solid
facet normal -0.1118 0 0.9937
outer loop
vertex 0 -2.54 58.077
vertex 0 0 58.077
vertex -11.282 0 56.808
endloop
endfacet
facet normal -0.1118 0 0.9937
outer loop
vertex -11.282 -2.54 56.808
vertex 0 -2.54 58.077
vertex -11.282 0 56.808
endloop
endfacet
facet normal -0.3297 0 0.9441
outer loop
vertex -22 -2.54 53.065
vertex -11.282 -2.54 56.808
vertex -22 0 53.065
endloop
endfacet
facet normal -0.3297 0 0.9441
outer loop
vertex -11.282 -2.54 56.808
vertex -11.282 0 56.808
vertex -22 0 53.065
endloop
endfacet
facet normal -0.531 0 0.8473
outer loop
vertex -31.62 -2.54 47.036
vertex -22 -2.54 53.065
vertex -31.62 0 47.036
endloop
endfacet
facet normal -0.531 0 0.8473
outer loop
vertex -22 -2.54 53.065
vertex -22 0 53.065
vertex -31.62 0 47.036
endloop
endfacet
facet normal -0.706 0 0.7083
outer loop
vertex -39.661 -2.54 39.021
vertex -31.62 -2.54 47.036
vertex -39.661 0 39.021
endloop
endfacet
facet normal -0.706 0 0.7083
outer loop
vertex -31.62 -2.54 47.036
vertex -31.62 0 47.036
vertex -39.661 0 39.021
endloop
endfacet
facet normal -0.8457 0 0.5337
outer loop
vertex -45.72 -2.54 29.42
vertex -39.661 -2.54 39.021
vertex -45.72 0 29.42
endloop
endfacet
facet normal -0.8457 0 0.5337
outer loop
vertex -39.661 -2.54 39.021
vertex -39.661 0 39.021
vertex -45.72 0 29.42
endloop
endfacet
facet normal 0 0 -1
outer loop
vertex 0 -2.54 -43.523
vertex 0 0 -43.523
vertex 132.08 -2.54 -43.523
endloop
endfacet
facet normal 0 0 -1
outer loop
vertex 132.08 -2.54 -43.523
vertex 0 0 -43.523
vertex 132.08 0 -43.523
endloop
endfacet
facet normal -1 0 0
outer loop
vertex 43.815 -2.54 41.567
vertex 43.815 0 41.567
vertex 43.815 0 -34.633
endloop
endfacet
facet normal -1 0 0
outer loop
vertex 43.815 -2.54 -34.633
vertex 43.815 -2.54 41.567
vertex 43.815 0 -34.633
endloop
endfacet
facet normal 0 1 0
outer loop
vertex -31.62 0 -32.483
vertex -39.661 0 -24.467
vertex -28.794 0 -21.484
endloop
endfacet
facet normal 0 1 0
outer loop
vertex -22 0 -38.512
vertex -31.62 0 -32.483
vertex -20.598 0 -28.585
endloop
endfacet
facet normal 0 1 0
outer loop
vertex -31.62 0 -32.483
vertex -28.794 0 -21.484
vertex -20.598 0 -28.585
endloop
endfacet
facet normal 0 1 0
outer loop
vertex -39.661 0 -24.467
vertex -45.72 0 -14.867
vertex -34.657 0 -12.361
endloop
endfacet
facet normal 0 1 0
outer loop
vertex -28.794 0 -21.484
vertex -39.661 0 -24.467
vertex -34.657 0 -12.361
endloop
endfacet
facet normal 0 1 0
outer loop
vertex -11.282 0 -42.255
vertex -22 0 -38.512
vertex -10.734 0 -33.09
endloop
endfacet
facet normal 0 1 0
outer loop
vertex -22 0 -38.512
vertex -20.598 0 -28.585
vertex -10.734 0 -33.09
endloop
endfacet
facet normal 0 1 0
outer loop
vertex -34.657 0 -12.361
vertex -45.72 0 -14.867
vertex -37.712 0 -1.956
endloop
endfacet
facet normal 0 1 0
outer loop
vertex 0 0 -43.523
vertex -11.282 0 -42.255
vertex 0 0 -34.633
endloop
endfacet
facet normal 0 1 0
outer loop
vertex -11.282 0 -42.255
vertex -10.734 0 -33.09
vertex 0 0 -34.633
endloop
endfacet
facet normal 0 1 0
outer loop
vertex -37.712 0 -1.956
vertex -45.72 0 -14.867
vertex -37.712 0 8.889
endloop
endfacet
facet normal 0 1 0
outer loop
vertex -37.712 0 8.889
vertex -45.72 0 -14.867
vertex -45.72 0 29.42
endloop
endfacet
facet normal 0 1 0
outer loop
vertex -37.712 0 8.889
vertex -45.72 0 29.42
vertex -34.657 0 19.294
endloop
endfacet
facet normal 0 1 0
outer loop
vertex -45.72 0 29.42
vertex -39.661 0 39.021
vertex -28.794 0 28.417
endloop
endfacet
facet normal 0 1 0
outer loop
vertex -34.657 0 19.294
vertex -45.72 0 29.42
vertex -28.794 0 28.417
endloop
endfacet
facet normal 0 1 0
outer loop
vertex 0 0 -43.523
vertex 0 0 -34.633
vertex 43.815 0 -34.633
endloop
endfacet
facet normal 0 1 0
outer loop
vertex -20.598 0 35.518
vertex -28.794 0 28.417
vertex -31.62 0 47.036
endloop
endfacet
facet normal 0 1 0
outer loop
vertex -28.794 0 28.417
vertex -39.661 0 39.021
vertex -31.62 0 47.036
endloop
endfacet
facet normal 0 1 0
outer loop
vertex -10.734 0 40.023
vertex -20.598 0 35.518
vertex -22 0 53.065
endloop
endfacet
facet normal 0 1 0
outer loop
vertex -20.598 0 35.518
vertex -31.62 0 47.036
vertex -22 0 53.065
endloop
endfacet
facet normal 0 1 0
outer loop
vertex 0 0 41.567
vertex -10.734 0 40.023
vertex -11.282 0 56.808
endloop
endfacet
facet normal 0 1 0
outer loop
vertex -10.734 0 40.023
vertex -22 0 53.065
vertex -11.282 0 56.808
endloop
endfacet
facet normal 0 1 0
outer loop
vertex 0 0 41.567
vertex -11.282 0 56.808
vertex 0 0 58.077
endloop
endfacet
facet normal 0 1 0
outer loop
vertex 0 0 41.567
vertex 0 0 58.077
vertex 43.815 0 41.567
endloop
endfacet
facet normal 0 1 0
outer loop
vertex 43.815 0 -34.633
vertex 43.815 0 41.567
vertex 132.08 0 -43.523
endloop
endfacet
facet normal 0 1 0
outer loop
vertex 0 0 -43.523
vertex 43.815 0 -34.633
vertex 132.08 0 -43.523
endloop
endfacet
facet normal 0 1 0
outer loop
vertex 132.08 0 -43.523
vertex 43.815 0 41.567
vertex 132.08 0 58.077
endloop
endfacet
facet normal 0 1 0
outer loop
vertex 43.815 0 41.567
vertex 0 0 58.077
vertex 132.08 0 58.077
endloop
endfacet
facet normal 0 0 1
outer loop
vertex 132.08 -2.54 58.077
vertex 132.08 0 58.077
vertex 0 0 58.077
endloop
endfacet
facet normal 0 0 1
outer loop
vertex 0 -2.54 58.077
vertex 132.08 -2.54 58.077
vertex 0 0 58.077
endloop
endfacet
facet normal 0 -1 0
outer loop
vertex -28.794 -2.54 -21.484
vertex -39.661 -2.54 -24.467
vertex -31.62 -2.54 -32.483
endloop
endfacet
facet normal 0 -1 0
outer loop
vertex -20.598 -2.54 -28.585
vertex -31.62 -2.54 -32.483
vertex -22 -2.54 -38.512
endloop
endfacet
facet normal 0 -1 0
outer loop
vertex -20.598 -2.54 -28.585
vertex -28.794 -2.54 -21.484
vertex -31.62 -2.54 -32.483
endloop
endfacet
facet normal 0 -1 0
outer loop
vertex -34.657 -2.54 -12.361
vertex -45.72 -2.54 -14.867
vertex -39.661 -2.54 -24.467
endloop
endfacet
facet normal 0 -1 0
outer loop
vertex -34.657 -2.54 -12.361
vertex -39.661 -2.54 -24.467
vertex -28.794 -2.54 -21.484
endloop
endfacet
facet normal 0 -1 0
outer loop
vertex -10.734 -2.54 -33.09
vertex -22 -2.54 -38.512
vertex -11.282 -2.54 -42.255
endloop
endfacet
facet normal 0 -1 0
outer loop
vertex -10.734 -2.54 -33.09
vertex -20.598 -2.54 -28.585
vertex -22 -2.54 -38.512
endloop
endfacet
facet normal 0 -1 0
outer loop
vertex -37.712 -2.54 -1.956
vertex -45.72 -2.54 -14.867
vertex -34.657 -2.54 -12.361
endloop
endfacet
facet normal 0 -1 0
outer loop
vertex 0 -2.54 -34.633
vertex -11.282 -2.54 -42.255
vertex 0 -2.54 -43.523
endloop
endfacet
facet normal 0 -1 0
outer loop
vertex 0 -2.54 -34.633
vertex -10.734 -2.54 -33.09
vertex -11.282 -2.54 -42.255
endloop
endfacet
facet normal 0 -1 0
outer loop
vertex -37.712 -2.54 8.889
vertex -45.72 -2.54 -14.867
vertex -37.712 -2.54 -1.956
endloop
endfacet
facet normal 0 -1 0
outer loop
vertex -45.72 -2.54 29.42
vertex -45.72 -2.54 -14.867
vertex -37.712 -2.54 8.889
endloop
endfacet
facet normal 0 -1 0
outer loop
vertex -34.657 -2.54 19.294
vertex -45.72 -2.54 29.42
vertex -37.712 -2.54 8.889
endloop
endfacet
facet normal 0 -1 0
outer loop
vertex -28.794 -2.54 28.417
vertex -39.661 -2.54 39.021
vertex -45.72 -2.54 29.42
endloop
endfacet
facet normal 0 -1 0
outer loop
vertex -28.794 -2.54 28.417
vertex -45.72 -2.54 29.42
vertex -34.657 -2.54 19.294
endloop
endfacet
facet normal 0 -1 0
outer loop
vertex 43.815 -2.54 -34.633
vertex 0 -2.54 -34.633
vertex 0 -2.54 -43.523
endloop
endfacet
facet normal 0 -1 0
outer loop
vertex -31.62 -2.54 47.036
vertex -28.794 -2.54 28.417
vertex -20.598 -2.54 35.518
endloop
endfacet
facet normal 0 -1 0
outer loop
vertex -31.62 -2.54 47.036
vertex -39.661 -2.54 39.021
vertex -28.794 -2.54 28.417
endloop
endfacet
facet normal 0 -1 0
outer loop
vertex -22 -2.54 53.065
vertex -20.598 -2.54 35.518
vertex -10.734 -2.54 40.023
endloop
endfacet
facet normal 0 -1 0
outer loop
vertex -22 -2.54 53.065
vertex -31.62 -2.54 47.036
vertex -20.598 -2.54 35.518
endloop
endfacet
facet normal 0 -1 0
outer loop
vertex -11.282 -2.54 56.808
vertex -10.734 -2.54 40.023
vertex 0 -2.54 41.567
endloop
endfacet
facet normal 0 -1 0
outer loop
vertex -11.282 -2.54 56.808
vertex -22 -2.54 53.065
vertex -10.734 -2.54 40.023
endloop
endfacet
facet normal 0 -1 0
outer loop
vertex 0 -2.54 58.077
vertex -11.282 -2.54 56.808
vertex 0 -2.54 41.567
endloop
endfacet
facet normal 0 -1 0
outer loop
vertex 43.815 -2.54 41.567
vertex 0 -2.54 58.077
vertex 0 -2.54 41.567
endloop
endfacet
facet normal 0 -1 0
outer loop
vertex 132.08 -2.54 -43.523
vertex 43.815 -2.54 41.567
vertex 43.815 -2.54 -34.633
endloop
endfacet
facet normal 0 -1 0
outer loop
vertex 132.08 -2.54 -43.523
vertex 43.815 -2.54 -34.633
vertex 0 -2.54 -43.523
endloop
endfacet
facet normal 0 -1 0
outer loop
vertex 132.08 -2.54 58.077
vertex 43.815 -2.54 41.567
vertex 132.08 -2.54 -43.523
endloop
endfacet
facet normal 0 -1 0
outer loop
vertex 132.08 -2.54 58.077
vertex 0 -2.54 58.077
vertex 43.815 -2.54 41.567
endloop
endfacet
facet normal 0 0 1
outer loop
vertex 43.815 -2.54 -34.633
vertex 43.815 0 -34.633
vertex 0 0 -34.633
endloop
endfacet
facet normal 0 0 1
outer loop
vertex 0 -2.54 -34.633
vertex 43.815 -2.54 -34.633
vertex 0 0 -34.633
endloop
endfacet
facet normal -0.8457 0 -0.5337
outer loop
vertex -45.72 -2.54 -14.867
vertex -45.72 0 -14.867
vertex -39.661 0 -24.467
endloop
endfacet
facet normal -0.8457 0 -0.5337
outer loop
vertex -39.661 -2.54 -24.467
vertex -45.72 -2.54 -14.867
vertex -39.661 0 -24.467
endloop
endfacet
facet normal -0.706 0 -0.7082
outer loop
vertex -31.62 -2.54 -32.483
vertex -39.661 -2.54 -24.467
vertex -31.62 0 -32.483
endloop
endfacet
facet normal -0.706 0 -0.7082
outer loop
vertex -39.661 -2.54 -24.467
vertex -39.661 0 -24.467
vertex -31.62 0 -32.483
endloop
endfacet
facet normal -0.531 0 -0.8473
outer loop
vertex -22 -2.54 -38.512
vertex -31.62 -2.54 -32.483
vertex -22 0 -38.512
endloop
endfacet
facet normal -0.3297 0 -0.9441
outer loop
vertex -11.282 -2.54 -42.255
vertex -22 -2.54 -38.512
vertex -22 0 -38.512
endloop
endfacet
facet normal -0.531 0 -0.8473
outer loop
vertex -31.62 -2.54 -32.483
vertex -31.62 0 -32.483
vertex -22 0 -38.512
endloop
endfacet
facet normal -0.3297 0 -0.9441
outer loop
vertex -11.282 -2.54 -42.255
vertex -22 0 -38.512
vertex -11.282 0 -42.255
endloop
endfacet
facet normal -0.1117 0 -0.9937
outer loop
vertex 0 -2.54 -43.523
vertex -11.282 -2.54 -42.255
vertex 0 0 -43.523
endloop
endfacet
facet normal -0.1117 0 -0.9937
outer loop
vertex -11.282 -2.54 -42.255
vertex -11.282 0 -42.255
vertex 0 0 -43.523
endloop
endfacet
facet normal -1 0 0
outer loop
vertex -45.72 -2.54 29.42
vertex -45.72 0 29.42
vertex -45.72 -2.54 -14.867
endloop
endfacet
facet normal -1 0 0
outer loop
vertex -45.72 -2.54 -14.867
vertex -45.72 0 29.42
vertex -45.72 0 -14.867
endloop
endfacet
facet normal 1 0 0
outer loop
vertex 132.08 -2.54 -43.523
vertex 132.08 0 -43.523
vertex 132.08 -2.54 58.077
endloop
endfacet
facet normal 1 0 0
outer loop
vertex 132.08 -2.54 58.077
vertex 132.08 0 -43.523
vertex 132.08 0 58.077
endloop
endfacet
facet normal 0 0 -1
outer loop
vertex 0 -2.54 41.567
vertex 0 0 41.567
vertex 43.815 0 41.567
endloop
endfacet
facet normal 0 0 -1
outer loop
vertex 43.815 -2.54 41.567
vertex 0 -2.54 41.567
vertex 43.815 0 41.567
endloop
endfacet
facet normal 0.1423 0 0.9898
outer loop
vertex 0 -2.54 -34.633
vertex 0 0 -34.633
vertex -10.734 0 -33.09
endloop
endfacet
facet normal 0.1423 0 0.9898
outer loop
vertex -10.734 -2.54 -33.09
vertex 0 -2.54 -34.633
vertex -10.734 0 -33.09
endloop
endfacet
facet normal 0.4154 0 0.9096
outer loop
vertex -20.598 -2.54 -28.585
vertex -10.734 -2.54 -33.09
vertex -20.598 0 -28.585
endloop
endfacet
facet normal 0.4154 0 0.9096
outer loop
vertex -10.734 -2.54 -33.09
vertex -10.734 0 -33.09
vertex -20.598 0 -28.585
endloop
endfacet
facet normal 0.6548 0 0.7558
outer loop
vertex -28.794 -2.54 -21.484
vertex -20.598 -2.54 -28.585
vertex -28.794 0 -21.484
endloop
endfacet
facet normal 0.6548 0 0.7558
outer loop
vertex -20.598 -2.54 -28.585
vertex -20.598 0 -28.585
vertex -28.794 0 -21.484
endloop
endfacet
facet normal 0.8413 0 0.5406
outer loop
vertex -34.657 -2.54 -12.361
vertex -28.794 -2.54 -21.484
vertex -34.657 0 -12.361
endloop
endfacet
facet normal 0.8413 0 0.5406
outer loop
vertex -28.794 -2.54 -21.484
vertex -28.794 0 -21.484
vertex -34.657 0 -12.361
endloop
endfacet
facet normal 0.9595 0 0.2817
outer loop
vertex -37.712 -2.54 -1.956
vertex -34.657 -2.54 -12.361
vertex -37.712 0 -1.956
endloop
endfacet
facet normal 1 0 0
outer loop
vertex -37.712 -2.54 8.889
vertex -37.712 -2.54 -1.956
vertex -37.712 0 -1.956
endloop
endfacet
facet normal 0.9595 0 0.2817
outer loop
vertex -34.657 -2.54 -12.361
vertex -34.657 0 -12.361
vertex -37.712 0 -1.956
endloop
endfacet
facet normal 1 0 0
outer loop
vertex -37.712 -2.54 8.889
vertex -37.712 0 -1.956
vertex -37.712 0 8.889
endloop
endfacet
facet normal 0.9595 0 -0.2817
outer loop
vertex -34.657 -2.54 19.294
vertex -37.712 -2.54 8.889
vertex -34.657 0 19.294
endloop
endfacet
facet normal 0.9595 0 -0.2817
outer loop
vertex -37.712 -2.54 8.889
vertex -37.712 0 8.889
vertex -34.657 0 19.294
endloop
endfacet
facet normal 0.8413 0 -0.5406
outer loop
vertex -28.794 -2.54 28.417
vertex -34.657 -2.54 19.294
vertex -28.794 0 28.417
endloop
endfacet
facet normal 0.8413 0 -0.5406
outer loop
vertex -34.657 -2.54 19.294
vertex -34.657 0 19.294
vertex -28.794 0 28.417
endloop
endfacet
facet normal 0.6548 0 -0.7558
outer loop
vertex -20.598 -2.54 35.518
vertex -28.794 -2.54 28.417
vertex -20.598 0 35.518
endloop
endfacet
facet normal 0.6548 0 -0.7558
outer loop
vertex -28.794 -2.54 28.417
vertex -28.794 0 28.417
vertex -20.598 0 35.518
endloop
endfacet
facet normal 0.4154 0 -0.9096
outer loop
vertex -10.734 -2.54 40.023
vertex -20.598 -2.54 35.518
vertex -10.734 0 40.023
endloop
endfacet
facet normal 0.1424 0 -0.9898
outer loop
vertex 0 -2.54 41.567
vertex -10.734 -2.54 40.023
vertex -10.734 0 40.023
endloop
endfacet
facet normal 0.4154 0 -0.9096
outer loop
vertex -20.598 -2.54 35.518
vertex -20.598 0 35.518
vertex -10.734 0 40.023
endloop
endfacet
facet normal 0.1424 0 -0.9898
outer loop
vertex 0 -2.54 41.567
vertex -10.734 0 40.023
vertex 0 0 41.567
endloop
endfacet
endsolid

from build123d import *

# Parameters (mm, degrees)
F1_DEPTH = 2.54


with BuildPart() as f1:
    # F0 (on Front) → F1 (new body)
    with BuildSketch(Plane.XZ):
        with BuildLine():
            Line((-45.72, 29.41983), (-45.72, -14.866583))
            ThreePointArc((-45.72, -14.866583), (-26.979299, -35.767046), (0, -43.523377))
            Line((0, -43.523377), (132.08, -43.523377))
            Line((132.08, -43.523377), (132.08, 58.076623))
            Line((132.08, 58.076623), (0, 58.076623))
            ThreePointArc((0, 58.076623), (-26.979299, 50.320292), (-45.72, 29.41983))
        make_face()
        with BuildLine():
            ThreePointArc((0, -34.633377), (-38.1, 3.466623), (0, 41.566623))
            Line((0, 41.566623), (43.815, 41.566623))
            Line((43.815, 41.566623), (43.815, -34.633377))
            Line((43.815, -34.633377), (0, -34.633377))
        make_face(mode=Mode.SUBTRACT)
    extrude(amount=F1_DEPTH)


solid = f1.part
